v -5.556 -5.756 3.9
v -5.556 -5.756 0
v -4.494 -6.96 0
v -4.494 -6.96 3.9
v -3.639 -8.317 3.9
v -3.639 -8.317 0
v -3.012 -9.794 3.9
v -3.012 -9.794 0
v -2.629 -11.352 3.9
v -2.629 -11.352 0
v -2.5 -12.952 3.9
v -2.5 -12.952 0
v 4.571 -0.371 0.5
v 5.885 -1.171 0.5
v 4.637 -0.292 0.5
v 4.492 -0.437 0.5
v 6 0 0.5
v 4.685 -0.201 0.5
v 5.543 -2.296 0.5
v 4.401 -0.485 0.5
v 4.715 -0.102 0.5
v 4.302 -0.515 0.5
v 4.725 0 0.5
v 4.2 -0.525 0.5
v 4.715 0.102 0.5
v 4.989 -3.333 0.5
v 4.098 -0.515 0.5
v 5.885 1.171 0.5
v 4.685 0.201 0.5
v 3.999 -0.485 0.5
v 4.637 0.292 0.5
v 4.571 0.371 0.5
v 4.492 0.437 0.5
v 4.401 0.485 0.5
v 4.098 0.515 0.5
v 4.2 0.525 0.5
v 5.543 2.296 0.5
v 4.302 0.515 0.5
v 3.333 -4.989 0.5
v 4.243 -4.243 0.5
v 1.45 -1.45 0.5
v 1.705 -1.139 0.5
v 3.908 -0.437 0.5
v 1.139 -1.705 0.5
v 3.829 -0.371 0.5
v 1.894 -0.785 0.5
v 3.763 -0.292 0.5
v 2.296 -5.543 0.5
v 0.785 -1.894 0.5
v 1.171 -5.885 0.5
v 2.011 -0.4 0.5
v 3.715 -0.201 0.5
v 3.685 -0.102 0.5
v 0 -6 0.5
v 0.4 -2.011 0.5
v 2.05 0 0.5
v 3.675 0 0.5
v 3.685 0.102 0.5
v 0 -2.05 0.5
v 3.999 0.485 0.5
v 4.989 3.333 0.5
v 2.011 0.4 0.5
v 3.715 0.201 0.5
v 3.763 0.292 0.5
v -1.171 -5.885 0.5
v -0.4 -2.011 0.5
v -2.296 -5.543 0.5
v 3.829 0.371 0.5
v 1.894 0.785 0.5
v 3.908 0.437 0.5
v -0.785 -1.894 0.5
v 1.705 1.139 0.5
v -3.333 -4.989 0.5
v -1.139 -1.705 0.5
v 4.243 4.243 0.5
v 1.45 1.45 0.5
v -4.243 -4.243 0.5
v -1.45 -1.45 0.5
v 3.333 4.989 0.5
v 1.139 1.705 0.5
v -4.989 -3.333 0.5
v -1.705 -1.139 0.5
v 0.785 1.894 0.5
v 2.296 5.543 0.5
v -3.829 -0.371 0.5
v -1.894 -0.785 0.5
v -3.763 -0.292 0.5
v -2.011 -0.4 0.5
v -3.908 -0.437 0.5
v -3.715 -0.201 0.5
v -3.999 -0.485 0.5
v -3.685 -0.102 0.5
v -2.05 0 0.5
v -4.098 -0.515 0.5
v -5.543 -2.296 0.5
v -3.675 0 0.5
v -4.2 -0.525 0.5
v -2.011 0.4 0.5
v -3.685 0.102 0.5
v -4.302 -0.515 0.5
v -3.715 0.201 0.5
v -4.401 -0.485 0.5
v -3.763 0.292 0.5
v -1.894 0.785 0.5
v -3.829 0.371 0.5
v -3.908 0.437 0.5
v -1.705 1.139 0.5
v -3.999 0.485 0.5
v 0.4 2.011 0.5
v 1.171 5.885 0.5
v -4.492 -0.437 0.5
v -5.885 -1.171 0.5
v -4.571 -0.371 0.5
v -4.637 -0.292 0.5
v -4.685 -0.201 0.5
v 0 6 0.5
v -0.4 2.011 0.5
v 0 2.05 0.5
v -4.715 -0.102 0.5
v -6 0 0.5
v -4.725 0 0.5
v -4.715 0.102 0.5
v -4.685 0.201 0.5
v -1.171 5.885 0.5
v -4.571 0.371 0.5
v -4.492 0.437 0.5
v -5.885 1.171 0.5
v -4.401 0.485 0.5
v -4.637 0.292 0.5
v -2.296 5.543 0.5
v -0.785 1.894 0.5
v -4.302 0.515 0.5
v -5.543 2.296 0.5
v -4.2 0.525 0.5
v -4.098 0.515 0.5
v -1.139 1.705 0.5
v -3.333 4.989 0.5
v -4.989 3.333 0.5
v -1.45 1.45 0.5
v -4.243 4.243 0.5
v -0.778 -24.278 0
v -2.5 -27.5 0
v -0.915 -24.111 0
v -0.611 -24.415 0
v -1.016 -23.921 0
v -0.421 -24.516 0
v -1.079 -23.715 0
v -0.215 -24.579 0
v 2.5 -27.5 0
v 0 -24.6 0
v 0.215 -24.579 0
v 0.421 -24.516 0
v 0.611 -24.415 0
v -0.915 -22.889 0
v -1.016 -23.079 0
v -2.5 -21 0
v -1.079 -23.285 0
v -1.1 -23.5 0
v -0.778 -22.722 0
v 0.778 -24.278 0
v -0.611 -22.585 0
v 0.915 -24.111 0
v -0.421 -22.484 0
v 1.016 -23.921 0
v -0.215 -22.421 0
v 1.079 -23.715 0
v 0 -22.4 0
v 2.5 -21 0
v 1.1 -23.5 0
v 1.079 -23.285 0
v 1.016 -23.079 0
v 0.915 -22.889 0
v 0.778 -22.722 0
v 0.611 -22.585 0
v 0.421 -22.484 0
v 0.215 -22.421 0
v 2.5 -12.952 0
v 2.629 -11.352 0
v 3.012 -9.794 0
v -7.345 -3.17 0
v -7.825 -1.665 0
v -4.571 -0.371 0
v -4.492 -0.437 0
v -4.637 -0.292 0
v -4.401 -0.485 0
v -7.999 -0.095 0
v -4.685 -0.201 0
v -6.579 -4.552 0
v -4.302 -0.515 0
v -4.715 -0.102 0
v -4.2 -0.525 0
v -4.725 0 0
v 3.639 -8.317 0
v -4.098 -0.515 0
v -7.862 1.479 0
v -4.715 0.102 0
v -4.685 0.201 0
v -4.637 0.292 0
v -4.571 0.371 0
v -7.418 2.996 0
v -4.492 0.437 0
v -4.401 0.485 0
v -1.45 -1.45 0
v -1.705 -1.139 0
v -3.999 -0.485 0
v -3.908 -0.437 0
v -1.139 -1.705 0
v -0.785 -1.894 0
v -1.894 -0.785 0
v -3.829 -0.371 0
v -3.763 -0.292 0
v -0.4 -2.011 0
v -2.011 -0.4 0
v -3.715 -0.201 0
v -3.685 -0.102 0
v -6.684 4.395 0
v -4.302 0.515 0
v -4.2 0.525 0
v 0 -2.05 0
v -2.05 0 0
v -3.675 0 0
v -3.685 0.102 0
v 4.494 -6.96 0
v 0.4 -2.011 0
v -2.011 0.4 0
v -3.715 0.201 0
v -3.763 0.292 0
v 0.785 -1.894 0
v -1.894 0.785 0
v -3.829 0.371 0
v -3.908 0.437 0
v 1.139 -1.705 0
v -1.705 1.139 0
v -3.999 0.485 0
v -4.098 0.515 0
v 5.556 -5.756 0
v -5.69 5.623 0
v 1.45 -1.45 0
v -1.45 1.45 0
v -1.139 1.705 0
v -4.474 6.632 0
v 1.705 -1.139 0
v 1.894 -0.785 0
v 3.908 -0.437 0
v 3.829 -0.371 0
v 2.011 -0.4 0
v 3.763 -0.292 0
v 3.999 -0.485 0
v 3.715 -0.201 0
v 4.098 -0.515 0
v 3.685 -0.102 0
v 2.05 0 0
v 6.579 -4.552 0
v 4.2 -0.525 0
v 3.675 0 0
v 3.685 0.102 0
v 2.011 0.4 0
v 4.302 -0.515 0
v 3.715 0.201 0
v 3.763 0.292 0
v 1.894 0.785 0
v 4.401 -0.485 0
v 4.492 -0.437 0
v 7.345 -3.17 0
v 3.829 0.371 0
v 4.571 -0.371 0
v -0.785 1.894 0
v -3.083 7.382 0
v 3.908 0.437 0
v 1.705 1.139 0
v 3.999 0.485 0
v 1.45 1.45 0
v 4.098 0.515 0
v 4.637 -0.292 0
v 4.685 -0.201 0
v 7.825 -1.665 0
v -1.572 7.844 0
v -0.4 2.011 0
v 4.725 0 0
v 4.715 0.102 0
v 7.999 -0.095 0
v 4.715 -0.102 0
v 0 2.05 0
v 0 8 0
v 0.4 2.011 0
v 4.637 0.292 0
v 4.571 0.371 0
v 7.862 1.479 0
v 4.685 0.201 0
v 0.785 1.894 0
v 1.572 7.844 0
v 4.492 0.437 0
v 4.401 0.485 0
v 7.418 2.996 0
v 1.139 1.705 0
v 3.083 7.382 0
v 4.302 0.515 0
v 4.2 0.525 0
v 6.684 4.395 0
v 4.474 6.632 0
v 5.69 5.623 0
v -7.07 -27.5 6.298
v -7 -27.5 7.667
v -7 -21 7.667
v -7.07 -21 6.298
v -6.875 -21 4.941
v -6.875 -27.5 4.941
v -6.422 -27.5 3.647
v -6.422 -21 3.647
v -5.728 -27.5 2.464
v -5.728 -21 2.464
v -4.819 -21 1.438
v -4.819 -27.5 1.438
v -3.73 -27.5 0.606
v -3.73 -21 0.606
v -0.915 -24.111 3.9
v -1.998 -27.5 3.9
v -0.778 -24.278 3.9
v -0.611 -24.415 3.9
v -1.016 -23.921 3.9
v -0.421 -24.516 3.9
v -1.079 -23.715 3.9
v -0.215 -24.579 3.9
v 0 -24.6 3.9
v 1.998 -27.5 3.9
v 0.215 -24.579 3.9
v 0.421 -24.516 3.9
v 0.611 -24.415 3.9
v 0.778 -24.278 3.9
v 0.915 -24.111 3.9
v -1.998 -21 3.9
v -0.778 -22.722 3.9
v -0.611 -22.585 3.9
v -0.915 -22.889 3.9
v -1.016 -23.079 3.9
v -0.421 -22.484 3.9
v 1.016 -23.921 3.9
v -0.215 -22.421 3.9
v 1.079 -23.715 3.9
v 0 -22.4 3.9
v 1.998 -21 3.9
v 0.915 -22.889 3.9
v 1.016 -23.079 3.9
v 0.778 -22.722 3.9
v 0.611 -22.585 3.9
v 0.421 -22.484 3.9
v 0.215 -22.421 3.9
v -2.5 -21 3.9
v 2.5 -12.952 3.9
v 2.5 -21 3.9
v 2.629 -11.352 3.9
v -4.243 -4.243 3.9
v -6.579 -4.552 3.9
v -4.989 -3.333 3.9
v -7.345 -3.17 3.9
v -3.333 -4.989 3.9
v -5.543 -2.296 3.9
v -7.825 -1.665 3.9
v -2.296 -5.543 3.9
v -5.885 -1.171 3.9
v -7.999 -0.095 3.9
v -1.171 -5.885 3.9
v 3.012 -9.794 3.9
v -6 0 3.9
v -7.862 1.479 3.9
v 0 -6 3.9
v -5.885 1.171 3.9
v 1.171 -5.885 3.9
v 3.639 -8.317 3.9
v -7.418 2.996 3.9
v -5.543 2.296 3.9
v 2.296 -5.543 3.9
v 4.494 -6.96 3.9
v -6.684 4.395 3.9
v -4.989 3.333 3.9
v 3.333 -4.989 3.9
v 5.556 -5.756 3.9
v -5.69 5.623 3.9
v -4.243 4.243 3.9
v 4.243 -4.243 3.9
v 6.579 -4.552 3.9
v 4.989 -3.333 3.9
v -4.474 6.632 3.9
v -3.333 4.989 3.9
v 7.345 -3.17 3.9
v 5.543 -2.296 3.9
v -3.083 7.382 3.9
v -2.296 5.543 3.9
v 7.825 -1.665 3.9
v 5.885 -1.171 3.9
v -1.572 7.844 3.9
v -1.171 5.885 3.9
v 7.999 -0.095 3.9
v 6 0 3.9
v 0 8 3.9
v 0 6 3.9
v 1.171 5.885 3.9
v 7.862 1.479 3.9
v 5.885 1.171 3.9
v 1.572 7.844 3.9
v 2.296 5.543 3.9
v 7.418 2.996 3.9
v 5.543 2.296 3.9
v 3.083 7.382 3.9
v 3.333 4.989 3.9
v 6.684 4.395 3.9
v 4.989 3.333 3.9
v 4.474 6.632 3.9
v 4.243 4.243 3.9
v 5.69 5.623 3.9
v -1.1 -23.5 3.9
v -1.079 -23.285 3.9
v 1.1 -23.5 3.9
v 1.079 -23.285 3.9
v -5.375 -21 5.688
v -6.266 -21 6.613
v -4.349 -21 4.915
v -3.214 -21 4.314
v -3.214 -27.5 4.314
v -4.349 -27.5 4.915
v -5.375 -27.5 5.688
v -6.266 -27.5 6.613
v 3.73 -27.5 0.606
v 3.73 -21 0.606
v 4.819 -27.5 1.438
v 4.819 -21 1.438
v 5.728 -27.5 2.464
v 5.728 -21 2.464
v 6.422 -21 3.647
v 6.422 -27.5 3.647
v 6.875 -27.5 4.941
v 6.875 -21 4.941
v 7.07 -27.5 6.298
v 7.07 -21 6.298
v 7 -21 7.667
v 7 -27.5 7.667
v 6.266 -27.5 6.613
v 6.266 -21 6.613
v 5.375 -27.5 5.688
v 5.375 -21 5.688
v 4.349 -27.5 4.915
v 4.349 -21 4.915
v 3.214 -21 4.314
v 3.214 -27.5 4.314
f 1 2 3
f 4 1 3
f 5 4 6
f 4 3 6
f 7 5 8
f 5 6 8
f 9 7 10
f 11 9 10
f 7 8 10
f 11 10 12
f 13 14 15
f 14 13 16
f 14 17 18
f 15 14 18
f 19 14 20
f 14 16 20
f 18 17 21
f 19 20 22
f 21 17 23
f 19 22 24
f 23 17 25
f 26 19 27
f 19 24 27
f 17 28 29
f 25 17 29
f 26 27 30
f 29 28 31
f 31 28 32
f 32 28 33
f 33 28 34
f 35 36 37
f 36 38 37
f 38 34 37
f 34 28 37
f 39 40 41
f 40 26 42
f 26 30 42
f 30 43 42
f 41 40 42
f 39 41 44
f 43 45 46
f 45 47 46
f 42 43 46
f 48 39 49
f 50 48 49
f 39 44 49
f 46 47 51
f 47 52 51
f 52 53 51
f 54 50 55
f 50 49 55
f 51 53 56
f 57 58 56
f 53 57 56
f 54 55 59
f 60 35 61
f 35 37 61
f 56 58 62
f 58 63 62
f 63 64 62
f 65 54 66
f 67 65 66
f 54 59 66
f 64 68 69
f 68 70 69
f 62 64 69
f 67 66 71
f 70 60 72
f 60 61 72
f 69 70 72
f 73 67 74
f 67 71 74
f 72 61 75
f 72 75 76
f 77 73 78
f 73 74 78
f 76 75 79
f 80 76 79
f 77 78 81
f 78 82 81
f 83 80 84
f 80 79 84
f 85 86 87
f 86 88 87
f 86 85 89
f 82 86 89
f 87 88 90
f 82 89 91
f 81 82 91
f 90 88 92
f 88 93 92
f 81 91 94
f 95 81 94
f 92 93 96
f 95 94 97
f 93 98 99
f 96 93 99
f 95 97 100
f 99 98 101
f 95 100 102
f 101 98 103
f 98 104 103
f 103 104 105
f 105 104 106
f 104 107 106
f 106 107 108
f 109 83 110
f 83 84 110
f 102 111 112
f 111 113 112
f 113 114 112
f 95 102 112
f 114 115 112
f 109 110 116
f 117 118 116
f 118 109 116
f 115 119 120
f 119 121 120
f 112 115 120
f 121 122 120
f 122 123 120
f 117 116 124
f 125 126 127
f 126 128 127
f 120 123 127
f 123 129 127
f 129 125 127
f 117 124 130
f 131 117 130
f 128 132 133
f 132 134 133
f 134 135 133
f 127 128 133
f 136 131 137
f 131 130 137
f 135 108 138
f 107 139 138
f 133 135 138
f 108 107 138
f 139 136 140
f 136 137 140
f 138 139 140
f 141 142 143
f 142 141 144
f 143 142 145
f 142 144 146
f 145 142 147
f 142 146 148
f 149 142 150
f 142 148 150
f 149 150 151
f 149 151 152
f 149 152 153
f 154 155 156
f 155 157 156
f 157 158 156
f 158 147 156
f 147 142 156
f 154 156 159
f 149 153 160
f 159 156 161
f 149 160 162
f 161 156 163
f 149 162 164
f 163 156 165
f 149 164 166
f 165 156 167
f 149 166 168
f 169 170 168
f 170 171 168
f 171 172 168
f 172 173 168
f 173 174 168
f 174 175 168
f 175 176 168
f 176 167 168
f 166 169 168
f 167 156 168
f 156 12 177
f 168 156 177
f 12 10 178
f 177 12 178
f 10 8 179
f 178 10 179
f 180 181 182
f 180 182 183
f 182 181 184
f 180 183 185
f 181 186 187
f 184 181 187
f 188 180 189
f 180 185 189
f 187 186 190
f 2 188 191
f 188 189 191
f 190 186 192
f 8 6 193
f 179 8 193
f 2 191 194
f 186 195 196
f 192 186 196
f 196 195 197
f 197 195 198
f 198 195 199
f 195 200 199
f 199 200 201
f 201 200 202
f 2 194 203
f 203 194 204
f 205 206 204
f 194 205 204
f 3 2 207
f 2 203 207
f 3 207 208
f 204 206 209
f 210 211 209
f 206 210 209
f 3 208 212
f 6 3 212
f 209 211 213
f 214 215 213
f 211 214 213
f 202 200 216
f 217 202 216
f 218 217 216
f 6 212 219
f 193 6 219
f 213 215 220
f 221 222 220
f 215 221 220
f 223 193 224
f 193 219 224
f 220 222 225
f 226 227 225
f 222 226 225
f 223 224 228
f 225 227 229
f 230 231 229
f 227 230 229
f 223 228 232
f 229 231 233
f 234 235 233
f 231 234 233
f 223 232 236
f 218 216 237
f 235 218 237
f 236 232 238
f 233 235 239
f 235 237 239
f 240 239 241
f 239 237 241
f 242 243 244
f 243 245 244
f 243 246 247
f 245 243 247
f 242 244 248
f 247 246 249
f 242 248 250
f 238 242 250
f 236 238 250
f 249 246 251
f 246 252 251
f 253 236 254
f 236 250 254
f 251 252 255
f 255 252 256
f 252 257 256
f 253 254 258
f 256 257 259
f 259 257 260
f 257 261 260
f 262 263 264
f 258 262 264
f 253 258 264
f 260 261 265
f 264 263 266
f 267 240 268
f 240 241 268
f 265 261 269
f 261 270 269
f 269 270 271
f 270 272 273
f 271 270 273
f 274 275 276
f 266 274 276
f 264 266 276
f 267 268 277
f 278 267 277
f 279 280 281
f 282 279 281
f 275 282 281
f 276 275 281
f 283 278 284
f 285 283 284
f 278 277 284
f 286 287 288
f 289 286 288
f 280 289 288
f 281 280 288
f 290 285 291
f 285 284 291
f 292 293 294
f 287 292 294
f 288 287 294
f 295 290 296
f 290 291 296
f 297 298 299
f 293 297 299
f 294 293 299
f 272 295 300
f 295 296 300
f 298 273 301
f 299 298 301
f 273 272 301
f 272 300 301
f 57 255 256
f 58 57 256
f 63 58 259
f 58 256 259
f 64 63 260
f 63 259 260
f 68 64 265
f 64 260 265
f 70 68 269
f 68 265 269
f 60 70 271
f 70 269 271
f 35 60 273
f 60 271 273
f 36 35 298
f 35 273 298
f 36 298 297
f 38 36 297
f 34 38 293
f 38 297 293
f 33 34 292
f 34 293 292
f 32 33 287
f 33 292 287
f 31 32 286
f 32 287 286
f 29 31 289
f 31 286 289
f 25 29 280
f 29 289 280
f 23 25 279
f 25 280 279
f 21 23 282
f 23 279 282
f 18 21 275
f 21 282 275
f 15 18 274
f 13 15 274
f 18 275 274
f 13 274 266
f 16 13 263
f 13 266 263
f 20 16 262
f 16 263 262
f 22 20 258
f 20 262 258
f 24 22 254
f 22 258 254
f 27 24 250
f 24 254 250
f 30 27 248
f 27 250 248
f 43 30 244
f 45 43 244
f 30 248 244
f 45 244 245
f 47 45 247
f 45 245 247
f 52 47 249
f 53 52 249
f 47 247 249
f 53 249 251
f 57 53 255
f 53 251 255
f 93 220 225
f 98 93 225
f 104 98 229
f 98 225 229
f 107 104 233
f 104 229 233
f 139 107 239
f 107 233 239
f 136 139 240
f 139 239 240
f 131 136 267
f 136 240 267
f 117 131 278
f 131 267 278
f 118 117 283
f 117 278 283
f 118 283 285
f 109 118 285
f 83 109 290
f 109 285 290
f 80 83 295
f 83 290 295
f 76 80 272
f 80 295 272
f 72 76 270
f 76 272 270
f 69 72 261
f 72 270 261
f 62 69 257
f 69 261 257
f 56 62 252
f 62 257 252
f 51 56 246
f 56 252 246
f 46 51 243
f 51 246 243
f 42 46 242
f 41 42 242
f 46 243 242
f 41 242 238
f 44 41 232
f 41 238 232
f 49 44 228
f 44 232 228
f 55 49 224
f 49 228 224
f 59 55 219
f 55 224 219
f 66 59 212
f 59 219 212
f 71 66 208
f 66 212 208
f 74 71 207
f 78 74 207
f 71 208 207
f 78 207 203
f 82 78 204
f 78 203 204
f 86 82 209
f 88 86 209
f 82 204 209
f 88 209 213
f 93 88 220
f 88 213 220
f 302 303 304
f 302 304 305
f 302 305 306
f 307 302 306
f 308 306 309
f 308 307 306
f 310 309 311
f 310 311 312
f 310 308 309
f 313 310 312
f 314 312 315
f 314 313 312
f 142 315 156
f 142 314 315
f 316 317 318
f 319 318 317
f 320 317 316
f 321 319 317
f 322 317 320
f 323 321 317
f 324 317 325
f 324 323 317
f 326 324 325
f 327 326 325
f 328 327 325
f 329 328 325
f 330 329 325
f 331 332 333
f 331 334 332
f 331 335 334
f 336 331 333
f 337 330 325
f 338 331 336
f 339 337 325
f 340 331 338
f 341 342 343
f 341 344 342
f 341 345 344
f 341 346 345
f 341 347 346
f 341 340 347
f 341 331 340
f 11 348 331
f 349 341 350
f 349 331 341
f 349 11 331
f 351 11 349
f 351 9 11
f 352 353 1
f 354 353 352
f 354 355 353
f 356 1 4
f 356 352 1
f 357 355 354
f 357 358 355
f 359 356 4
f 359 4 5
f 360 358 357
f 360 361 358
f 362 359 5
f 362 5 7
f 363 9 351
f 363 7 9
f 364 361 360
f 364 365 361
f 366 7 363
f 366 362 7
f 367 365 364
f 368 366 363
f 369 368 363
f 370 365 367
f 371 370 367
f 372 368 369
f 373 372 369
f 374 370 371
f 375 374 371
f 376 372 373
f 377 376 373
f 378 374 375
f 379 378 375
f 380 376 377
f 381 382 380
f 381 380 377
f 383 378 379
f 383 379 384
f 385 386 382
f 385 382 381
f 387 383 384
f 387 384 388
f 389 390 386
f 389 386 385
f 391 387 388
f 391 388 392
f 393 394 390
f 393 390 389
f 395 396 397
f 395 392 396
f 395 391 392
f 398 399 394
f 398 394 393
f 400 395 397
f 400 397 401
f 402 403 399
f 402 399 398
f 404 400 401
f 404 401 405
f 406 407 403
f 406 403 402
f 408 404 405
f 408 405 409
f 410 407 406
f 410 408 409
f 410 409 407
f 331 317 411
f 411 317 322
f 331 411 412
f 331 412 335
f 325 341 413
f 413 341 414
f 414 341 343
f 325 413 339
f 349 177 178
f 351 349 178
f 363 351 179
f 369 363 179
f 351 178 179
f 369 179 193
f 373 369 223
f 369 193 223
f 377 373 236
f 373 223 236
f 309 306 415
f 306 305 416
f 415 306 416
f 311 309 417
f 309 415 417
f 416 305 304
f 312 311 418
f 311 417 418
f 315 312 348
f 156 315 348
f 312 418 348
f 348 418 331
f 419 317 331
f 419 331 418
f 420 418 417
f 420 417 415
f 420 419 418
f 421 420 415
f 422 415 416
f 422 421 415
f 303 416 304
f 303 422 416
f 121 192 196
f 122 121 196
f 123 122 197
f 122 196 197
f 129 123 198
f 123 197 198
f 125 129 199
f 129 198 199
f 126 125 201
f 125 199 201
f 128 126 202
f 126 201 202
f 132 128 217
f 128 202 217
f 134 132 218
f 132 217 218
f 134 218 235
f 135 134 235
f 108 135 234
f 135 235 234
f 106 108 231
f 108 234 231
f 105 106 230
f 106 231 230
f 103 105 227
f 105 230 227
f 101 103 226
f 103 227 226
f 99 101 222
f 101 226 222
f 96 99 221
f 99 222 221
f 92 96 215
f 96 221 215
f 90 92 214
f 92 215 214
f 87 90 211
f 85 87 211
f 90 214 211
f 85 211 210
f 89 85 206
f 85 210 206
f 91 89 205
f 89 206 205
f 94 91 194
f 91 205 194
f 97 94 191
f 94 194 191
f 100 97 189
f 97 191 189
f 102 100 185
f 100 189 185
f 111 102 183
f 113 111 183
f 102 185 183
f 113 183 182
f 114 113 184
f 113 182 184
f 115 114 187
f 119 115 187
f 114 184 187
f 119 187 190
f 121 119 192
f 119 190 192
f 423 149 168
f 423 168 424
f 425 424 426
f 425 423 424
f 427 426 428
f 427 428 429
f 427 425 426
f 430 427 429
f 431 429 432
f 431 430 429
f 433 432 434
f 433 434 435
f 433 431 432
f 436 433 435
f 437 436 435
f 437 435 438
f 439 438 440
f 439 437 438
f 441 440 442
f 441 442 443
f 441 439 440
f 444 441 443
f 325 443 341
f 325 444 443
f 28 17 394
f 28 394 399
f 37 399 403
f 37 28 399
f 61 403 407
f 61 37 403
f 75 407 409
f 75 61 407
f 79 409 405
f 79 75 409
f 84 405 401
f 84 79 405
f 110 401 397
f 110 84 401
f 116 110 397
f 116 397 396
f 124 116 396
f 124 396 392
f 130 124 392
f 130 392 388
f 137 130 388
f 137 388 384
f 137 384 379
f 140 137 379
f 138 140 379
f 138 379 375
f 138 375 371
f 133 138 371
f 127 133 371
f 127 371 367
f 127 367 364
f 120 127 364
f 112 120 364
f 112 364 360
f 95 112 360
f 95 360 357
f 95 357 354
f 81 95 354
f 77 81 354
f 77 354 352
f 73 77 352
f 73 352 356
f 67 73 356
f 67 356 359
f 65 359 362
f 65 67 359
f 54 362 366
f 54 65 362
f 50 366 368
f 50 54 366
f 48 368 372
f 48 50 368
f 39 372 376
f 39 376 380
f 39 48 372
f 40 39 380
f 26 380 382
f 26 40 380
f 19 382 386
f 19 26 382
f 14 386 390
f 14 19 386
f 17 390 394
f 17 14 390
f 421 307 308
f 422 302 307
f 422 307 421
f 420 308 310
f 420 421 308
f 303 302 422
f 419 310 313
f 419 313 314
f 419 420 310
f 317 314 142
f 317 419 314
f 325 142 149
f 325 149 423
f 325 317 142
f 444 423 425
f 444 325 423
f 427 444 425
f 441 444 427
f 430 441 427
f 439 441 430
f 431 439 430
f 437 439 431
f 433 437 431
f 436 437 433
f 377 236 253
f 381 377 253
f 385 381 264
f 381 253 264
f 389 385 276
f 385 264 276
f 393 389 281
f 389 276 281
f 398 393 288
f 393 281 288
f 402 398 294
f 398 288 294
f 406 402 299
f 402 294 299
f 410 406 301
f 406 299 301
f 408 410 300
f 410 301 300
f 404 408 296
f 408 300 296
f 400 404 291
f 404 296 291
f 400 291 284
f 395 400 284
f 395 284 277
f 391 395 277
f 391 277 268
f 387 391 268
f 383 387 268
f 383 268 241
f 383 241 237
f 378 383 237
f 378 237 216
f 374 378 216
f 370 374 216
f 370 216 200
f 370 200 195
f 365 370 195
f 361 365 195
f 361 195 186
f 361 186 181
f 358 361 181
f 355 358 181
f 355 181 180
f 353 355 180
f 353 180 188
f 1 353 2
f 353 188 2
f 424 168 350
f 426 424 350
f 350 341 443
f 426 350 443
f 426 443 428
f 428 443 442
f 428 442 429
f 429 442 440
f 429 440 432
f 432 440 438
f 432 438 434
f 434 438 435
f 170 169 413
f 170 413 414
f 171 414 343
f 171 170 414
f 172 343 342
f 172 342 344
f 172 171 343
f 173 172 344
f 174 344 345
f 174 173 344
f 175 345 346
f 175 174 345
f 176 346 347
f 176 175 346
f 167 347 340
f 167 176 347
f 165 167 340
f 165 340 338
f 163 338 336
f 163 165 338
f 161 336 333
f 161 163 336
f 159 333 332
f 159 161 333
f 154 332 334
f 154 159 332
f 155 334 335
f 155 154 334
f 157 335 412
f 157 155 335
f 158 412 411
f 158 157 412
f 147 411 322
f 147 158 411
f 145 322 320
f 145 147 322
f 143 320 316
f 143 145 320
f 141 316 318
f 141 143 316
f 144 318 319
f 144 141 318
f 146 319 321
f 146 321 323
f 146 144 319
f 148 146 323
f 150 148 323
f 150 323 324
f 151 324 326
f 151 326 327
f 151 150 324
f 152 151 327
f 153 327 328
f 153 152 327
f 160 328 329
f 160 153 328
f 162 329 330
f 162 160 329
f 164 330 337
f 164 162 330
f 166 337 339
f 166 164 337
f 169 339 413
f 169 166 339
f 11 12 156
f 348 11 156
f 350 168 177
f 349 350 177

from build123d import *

# Parameters (mm, degrees)
SKETCH1_R           = 6
SKETCH1_R_2         = 1.1
BOSS_EXTRUDE1_DEPTH = 3.9
SKETCH5_R           = 8
SKETCH5_R_2         = 2.05
SKETCH5_R_3         = 0.525
BOSS_EXTRUDE3_DEPTH = 0.5
BOSS_EXTRUDE4_DEPTH = 6.5


with BuildPart() as part:
    # Sketch1 → Boss-Extrude1 (new body)
    with BuildSketch(Plane.XY):
        with BuildLine():
            Line((-2.5, -27.5), (2.5, -27.5))
            Line((2.5, -27.5), (2.5, -12.951833847))
            ThreePointArc((2.5, -12.951833847), (3.295532486, -9.043154047), (5.555555556, -5.756370599))
            ThreePointArc((5.555555556, -5.756370599), (0, 8), (-5.555555556, -5.756370599))
            ThreePointArc((-5.555555556, -5.756370599), (-3.295532486, -9.043154047), (-2.5, -12.951833847))
            Line((-2.5, -12.951833847), (-2.5, -27.5))
        make_face()
        Circle(SKETCH1_R, mode=Mode.SUBTRACT)
        with Locations((0, -23.5)):
            Circle(SKETCH1_R_2, mode=Mode.SUBTRACT)
    extrude(amount=BOSS_EXTRUDE1_DEPTH)

    # Sketch5 → Boss-Extrude3 (add)
    with BuildSketch(Plane(origin=(0, 0, 0), x_dir=(-1, 0, 0), z_dir=(0, 0, -1))):
        Circle(SKETCH5_R)
        Circle(SKETCH5_R_2, mode=Mode.SUBTRACT)
        with Locations((4.2, 0)):
            Circle(SKETCH5_R_3, mode=Mode.SUBTRACT)
        with Locations((-4.2, 0)):
            Circle(SKETCH5_R_3, mode=Mode.SUBTRACT)
    extrude(amount=-BOSS_EXTRUDE3_DEPTH)

    # Sketch7 → Boss-Extrude4 (add)
    with BuildSketch(Plane.XZ.offset(27.5)):
        with BuildLine():
            ThreePointArc((7, 7.666888651), (4.877255668, 5.281037947), (1.997835367, 3.9))
            Line((1.997835367, 3.9), (2.5, 3.9))
            Line((2.5, 3.9), (2.5, 0))
            ThreePointArc((2.5, 0), (6.103916398, 3.038777275), (7, 7.666888651))
        make_face()
        with BuildLine():
            Line((-2.5, 3.9), (-1.997835367, 3.9))
            ThreePointArc((-1.997835367, 3.9), (-4.877255668, 5.281037947), (-7, 7.666888651))
            ThreePointArc((-7, 7.666888651), (-6.103916398, 3.038777275), (-2.5, 0))
            Line((-2.5, 0), (-2.5, 3.9))
        make_face()
    extrude(amount=-BOSS_EXTRUDE4_DEPTH)


solid = part.part
